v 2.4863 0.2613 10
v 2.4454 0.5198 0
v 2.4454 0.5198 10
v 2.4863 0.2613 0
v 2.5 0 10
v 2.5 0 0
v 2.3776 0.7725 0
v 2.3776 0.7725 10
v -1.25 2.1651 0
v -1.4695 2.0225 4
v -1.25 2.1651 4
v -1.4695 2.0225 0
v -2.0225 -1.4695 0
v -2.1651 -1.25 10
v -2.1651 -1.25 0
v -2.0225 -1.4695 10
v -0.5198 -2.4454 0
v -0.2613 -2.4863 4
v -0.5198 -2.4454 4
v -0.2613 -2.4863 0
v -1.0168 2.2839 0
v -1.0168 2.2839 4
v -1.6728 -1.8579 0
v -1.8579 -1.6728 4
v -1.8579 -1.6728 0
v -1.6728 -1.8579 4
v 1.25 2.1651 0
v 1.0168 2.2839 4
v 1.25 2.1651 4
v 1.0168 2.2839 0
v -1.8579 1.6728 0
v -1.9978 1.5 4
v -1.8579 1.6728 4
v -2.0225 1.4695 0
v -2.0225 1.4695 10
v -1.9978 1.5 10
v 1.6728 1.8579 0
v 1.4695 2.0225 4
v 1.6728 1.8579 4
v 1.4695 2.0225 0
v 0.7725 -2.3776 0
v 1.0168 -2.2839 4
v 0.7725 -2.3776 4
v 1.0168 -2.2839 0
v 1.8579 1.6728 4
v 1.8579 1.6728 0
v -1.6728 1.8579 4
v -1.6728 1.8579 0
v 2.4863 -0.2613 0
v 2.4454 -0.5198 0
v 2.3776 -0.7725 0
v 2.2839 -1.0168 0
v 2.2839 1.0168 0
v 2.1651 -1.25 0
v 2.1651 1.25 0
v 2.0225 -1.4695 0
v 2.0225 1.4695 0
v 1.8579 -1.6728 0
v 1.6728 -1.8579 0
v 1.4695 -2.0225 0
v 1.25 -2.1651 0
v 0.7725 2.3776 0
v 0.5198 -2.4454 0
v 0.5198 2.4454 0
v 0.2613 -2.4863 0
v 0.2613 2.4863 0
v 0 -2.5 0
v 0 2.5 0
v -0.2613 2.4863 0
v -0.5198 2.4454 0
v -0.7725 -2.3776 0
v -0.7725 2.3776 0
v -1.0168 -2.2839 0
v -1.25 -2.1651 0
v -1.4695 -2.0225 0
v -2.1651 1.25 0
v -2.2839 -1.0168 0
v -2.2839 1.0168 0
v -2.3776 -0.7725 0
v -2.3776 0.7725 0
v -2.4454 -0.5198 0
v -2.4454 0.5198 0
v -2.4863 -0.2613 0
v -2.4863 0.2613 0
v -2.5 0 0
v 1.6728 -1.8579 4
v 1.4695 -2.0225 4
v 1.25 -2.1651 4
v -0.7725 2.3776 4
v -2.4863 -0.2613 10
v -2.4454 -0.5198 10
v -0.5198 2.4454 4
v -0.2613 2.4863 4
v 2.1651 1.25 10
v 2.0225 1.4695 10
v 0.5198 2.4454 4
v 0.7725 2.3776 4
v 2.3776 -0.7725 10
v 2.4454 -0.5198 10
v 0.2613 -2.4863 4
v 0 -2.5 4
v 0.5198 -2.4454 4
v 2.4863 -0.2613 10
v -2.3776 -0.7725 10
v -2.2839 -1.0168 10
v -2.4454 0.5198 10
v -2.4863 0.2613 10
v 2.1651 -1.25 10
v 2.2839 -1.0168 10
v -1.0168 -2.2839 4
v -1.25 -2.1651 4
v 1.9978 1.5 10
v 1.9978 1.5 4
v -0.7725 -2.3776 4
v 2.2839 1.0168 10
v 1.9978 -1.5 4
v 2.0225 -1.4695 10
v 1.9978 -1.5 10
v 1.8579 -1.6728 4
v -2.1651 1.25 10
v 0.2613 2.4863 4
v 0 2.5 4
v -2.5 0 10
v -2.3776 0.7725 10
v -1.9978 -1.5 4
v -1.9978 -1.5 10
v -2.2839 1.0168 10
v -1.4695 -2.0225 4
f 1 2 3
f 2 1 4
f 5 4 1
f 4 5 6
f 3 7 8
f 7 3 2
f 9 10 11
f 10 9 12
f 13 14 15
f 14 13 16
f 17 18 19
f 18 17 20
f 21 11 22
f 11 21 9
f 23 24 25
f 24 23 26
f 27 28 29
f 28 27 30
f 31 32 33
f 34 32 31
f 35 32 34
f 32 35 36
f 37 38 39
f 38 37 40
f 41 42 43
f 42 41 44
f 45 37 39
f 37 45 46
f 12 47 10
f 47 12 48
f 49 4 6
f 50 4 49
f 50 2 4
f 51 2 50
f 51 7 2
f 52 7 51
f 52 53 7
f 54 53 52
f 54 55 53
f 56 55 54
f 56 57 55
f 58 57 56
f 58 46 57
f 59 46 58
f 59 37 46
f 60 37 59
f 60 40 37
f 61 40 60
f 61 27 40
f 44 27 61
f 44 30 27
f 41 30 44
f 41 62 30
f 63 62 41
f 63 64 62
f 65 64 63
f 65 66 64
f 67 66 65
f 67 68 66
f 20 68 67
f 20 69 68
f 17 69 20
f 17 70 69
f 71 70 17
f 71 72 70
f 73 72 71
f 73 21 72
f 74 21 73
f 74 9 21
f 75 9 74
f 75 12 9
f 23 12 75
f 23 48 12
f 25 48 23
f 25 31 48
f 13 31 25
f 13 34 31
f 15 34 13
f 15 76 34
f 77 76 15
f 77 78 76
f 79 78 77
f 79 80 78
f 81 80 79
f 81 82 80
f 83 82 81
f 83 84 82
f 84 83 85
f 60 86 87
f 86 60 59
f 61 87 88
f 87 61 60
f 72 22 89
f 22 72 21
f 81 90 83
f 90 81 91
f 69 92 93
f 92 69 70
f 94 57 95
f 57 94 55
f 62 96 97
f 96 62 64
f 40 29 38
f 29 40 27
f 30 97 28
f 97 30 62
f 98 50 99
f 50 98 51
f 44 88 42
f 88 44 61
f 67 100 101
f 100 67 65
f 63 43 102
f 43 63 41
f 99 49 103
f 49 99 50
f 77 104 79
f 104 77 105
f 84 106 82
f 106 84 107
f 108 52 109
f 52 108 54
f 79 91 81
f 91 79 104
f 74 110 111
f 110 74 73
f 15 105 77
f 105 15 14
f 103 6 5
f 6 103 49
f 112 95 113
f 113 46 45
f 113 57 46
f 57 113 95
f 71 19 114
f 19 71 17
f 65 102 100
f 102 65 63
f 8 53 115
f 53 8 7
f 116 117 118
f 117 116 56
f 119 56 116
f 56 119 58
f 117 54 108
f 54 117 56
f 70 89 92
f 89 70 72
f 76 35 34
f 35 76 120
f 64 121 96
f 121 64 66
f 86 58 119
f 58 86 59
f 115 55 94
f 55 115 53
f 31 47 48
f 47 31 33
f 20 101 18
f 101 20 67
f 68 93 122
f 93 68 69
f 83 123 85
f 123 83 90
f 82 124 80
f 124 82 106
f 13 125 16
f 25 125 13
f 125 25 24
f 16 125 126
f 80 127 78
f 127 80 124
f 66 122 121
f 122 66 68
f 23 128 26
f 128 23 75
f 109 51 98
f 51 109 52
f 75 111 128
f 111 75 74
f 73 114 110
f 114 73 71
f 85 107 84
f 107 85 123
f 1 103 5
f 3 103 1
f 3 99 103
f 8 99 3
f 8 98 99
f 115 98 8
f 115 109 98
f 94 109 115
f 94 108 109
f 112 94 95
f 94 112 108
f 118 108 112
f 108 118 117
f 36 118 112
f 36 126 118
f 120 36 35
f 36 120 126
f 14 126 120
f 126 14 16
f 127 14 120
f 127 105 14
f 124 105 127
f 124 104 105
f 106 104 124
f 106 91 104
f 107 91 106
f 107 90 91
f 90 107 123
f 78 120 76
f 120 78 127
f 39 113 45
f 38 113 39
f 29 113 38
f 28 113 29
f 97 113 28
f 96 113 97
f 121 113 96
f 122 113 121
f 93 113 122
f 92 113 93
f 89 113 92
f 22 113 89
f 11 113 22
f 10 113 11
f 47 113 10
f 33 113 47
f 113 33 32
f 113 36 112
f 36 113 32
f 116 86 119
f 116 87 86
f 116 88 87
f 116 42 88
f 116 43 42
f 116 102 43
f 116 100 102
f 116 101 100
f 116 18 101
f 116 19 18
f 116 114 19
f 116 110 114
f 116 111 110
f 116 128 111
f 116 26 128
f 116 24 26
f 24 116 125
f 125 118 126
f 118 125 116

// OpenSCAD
28byj48_shaft_collar_radius = 9/2;
28byj48_shaft_collar_height = 1.5;

28byj48_shaft_radius = 5/2;
28byj48_shaft_height = 10;
28byj48_shaft_slotted_width = 3;
28byj48_shaft_slotted_height = 6;

eps = 0.01;
$fn = 60;

module shaft() {
    difference() {
        cylinder(r=28byj48_shaft_radius, h=28byj48_shaft_height);
        translate([-(28byj48_shaft_radius + eps), 28byj48_shaft_slotted_width / 2, 28byj48_shaft_height - 28byj48_shaft_slotted_height]) {
            cube([(28byj48_shaft_radius+eps)*2, 28byj48_shaft_radius, 28byj48_shaft_slotted_height+eps]);
        }
        translate([-(28byj48_shaft_radius + eps), - 28byj48_shaft_radius - (28byj48_shaft_slotted_width / 2), 28byj48_shaft_height - 28byj48_shaft_slotted_height]) {
            cube([(28byj48_shaft_radius+eps)*2, 28byj48_shaft_radius, 28byj48_shaft_slotted_height+eps]);
        }
    }
}

shaft();
